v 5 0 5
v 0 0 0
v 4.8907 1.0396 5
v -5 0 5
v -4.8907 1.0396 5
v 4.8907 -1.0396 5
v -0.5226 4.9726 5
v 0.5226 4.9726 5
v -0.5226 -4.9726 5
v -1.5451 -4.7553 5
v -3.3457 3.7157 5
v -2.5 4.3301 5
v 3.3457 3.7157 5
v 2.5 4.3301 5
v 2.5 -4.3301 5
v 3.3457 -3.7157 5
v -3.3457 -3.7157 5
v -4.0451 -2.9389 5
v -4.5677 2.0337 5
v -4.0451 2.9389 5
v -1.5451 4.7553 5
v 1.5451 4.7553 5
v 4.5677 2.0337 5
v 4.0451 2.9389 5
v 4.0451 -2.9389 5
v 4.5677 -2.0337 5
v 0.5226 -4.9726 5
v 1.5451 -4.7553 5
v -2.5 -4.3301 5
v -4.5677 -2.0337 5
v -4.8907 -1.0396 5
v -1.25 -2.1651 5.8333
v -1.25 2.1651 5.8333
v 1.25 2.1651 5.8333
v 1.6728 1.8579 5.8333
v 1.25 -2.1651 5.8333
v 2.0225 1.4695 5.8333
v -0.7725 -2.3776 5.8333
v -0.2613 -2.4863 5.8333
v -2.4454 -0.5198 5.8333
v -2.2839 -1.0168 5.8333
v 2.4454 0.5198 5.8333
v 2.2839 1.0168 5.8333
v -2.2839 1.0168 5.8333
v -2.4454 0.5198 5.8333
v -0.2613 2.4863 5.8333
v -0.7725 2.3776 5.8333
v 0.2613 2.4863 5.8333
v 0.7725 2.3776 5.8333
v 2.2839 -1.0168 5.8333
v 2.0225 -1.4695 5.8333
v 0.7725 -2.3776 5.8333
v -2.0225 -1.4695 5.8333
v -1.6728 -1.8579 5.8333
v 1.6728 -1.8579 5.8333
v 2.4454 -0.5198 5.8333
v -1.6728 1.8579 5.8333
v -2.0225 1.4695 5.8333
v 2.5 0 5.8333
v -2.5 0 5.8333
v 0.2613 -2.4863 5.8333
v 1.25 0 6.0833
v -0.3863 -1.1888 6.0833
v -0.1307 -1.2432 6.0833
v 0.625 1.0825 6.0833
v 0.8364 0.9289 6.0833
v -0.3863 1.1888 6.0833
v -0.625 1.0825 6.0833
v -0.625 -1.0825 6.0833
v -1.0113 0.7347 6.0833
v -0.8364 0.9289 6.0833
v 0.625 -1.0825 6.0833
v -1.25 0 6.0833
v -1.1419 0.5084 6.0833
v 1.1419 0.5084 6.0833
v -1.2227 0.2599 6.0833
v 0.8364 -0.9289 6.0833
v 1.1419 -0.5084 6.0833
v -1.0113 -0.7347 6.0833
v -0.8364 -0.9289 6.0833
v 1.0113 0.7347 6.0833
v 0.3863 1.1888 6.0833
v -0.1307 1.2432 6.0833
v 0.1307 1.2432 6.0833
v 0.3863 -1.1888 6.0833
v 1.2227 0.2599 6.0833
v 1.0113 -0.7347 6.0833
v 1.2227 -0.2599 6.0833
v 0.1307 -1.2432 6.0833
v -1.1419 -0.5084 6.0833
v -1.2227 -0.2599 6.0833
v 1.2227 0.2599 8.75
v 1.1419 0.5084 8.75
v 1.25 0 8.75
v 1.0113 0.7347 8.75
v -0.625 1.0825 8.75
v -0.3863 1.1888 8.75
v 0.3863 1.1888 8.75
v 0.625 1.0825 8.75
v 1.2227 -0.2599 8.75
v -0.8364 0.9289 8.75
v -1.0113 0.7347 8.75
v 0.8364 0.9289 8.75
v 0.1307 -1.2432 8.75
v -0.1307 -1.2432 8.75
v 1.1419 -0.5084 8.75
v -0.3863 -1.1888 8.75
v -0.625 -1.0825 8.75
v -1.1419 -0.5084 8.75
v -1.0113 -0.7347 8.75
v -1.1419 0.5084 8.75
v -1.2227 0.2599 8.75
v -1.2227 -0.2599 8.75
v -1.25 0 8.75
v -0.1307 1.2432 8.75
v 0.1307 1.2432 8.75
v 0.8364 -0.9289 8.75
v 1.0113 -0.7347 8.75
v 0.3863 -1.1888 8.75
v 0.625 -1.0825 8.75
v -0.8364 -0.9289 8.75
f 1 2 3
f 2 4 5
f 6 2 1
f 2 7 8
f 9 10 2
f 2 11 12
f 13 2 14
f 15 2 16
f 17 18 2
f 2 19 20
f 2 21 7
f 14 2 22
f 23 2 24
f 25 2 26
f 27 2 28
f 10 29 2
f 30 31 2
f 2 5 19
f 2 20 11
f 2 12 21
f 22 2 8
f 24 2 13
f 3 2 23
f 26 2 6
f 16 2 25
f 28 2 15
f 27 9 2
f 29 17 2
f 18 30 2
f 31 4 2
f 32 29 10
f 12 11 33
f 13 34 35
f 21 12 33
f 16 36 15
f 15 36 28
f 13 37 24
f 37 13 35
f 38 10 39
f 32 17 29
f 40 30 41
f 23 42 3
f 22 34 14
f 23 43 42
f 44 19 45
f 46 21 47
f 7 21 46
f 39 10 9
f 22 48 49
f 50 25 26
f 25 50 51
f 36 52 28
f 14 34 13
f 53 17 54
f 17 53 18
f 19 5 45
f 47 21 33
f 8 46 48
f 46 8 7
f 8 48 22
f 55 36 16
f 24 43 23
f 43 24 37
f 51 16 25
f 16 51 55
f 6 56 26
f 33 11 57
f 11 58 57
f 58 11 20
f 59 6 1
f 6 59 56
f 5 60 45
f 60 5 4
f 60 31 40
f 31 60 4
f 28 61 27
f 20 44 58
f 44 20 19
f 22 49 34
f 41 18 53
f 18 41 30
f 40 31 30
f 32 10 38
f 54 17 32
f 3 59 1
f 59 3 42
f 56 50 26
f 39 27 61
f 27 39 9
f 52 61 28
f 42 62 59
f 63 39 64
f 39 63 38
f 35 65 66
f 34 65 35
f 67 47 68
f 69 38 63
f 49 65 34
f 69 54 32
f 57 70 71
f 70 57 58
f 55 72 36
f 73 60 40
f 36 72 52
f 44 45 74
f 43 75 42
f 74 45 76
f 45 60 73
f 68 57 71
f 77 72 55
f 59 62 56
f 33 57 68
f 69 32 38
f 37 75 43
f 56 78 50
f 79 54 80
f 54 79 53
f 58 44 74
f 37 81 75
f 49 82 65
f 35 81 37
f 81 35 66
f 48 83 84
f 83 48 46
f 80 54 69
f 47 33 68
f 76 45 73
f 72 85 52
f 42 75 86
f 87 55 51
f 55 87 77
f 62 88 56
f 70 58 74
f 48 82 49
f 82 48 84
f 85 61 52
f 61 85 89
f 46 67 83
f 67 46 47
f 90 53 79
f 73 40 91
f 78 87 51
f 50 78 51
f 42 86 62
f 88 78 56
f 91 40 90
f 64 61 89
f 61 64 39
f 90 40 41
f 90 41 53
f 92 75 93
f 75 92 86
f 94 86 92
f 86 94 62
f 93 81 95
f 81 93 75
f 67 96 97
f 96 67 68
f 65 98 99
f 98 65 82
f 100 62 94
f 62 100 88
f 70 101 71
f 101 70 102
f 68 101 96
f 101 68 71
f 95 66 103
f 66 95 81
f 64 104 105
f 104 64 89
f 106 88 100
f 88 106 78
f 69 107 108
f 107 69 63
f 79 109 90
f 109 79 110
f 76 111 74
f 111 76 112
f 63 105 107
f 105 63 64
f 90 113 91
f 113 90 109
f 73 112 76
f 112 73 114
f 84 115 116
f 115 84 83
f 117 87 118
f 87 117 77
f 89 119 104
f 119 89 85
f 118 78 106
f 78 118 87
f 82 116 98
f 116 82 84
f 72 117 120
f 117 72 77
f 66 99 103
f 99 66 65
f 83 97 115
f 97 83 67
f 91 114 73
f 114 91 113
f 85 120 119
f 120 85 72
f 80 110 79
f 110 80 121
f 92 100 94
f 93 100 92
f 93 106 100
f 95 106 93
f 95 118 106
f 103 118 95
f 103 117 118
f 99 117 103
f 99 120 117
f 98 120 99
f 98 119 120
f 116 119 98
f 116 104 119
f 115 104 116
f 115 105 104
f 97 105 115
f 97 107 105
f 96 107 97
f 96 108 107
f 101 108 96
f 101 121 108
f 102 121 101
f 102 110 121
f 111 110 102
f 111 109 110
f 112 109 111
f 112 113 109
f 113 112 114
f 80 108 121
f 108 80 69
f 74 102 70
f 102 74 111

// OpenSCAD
module mouse() {
    radius = 10;
    linear_extrude(2) {
        circle(radius);
        translate([radius, -2*radius/3]) circle(radius /2);
        translate([radius, 2*radius/3]) circle(radius /2);
    }
}

module yoyo() {
    height = 5;
    top_radius = 10;
    cylinder(height, r1=top_radius, r2=top_radius/2);
    translate([0, 0, 2*height]) mirror([0, 0, 1]) cylinder(height, r1=top_radius, r2=top_radius/2);
}

module spinner() {
    m = 5;
    r = 5;
    cylinder(m, r1=0, r2=r);
    translate([0, 0, m]) cylinder(m/6, r1=r, r2=r/2);
    translate([0, 0, m + m/6]) cylinder(m/20, r1=r/2, r2=r/4);
    translate([0, 0, m]) cylinder(3/4*m, d=r/2);
}

module epcot() {
    translate([0, 0, 10]) sphere(10);
    cylinder(10, r1=7, r2=0);
}

module half_pipe() {
    difference() {
        cube([10, 10, 5]);
        {
            translate([5, 15, 6])
            rotate([90, 0, 0])
            cylinder(20, d=8);
        }
    }
}

module ice_cream() {
    difference() {
        cylinder(10, r1=0, r2=3);
        translate([0, 0, 2]) cylinder(10, r1=0, r2=3);
    }
}

$fn=30;
// mouse();
// yoyo();
spinner();
// epcot();
// half_pipe();
// ice_cream();
